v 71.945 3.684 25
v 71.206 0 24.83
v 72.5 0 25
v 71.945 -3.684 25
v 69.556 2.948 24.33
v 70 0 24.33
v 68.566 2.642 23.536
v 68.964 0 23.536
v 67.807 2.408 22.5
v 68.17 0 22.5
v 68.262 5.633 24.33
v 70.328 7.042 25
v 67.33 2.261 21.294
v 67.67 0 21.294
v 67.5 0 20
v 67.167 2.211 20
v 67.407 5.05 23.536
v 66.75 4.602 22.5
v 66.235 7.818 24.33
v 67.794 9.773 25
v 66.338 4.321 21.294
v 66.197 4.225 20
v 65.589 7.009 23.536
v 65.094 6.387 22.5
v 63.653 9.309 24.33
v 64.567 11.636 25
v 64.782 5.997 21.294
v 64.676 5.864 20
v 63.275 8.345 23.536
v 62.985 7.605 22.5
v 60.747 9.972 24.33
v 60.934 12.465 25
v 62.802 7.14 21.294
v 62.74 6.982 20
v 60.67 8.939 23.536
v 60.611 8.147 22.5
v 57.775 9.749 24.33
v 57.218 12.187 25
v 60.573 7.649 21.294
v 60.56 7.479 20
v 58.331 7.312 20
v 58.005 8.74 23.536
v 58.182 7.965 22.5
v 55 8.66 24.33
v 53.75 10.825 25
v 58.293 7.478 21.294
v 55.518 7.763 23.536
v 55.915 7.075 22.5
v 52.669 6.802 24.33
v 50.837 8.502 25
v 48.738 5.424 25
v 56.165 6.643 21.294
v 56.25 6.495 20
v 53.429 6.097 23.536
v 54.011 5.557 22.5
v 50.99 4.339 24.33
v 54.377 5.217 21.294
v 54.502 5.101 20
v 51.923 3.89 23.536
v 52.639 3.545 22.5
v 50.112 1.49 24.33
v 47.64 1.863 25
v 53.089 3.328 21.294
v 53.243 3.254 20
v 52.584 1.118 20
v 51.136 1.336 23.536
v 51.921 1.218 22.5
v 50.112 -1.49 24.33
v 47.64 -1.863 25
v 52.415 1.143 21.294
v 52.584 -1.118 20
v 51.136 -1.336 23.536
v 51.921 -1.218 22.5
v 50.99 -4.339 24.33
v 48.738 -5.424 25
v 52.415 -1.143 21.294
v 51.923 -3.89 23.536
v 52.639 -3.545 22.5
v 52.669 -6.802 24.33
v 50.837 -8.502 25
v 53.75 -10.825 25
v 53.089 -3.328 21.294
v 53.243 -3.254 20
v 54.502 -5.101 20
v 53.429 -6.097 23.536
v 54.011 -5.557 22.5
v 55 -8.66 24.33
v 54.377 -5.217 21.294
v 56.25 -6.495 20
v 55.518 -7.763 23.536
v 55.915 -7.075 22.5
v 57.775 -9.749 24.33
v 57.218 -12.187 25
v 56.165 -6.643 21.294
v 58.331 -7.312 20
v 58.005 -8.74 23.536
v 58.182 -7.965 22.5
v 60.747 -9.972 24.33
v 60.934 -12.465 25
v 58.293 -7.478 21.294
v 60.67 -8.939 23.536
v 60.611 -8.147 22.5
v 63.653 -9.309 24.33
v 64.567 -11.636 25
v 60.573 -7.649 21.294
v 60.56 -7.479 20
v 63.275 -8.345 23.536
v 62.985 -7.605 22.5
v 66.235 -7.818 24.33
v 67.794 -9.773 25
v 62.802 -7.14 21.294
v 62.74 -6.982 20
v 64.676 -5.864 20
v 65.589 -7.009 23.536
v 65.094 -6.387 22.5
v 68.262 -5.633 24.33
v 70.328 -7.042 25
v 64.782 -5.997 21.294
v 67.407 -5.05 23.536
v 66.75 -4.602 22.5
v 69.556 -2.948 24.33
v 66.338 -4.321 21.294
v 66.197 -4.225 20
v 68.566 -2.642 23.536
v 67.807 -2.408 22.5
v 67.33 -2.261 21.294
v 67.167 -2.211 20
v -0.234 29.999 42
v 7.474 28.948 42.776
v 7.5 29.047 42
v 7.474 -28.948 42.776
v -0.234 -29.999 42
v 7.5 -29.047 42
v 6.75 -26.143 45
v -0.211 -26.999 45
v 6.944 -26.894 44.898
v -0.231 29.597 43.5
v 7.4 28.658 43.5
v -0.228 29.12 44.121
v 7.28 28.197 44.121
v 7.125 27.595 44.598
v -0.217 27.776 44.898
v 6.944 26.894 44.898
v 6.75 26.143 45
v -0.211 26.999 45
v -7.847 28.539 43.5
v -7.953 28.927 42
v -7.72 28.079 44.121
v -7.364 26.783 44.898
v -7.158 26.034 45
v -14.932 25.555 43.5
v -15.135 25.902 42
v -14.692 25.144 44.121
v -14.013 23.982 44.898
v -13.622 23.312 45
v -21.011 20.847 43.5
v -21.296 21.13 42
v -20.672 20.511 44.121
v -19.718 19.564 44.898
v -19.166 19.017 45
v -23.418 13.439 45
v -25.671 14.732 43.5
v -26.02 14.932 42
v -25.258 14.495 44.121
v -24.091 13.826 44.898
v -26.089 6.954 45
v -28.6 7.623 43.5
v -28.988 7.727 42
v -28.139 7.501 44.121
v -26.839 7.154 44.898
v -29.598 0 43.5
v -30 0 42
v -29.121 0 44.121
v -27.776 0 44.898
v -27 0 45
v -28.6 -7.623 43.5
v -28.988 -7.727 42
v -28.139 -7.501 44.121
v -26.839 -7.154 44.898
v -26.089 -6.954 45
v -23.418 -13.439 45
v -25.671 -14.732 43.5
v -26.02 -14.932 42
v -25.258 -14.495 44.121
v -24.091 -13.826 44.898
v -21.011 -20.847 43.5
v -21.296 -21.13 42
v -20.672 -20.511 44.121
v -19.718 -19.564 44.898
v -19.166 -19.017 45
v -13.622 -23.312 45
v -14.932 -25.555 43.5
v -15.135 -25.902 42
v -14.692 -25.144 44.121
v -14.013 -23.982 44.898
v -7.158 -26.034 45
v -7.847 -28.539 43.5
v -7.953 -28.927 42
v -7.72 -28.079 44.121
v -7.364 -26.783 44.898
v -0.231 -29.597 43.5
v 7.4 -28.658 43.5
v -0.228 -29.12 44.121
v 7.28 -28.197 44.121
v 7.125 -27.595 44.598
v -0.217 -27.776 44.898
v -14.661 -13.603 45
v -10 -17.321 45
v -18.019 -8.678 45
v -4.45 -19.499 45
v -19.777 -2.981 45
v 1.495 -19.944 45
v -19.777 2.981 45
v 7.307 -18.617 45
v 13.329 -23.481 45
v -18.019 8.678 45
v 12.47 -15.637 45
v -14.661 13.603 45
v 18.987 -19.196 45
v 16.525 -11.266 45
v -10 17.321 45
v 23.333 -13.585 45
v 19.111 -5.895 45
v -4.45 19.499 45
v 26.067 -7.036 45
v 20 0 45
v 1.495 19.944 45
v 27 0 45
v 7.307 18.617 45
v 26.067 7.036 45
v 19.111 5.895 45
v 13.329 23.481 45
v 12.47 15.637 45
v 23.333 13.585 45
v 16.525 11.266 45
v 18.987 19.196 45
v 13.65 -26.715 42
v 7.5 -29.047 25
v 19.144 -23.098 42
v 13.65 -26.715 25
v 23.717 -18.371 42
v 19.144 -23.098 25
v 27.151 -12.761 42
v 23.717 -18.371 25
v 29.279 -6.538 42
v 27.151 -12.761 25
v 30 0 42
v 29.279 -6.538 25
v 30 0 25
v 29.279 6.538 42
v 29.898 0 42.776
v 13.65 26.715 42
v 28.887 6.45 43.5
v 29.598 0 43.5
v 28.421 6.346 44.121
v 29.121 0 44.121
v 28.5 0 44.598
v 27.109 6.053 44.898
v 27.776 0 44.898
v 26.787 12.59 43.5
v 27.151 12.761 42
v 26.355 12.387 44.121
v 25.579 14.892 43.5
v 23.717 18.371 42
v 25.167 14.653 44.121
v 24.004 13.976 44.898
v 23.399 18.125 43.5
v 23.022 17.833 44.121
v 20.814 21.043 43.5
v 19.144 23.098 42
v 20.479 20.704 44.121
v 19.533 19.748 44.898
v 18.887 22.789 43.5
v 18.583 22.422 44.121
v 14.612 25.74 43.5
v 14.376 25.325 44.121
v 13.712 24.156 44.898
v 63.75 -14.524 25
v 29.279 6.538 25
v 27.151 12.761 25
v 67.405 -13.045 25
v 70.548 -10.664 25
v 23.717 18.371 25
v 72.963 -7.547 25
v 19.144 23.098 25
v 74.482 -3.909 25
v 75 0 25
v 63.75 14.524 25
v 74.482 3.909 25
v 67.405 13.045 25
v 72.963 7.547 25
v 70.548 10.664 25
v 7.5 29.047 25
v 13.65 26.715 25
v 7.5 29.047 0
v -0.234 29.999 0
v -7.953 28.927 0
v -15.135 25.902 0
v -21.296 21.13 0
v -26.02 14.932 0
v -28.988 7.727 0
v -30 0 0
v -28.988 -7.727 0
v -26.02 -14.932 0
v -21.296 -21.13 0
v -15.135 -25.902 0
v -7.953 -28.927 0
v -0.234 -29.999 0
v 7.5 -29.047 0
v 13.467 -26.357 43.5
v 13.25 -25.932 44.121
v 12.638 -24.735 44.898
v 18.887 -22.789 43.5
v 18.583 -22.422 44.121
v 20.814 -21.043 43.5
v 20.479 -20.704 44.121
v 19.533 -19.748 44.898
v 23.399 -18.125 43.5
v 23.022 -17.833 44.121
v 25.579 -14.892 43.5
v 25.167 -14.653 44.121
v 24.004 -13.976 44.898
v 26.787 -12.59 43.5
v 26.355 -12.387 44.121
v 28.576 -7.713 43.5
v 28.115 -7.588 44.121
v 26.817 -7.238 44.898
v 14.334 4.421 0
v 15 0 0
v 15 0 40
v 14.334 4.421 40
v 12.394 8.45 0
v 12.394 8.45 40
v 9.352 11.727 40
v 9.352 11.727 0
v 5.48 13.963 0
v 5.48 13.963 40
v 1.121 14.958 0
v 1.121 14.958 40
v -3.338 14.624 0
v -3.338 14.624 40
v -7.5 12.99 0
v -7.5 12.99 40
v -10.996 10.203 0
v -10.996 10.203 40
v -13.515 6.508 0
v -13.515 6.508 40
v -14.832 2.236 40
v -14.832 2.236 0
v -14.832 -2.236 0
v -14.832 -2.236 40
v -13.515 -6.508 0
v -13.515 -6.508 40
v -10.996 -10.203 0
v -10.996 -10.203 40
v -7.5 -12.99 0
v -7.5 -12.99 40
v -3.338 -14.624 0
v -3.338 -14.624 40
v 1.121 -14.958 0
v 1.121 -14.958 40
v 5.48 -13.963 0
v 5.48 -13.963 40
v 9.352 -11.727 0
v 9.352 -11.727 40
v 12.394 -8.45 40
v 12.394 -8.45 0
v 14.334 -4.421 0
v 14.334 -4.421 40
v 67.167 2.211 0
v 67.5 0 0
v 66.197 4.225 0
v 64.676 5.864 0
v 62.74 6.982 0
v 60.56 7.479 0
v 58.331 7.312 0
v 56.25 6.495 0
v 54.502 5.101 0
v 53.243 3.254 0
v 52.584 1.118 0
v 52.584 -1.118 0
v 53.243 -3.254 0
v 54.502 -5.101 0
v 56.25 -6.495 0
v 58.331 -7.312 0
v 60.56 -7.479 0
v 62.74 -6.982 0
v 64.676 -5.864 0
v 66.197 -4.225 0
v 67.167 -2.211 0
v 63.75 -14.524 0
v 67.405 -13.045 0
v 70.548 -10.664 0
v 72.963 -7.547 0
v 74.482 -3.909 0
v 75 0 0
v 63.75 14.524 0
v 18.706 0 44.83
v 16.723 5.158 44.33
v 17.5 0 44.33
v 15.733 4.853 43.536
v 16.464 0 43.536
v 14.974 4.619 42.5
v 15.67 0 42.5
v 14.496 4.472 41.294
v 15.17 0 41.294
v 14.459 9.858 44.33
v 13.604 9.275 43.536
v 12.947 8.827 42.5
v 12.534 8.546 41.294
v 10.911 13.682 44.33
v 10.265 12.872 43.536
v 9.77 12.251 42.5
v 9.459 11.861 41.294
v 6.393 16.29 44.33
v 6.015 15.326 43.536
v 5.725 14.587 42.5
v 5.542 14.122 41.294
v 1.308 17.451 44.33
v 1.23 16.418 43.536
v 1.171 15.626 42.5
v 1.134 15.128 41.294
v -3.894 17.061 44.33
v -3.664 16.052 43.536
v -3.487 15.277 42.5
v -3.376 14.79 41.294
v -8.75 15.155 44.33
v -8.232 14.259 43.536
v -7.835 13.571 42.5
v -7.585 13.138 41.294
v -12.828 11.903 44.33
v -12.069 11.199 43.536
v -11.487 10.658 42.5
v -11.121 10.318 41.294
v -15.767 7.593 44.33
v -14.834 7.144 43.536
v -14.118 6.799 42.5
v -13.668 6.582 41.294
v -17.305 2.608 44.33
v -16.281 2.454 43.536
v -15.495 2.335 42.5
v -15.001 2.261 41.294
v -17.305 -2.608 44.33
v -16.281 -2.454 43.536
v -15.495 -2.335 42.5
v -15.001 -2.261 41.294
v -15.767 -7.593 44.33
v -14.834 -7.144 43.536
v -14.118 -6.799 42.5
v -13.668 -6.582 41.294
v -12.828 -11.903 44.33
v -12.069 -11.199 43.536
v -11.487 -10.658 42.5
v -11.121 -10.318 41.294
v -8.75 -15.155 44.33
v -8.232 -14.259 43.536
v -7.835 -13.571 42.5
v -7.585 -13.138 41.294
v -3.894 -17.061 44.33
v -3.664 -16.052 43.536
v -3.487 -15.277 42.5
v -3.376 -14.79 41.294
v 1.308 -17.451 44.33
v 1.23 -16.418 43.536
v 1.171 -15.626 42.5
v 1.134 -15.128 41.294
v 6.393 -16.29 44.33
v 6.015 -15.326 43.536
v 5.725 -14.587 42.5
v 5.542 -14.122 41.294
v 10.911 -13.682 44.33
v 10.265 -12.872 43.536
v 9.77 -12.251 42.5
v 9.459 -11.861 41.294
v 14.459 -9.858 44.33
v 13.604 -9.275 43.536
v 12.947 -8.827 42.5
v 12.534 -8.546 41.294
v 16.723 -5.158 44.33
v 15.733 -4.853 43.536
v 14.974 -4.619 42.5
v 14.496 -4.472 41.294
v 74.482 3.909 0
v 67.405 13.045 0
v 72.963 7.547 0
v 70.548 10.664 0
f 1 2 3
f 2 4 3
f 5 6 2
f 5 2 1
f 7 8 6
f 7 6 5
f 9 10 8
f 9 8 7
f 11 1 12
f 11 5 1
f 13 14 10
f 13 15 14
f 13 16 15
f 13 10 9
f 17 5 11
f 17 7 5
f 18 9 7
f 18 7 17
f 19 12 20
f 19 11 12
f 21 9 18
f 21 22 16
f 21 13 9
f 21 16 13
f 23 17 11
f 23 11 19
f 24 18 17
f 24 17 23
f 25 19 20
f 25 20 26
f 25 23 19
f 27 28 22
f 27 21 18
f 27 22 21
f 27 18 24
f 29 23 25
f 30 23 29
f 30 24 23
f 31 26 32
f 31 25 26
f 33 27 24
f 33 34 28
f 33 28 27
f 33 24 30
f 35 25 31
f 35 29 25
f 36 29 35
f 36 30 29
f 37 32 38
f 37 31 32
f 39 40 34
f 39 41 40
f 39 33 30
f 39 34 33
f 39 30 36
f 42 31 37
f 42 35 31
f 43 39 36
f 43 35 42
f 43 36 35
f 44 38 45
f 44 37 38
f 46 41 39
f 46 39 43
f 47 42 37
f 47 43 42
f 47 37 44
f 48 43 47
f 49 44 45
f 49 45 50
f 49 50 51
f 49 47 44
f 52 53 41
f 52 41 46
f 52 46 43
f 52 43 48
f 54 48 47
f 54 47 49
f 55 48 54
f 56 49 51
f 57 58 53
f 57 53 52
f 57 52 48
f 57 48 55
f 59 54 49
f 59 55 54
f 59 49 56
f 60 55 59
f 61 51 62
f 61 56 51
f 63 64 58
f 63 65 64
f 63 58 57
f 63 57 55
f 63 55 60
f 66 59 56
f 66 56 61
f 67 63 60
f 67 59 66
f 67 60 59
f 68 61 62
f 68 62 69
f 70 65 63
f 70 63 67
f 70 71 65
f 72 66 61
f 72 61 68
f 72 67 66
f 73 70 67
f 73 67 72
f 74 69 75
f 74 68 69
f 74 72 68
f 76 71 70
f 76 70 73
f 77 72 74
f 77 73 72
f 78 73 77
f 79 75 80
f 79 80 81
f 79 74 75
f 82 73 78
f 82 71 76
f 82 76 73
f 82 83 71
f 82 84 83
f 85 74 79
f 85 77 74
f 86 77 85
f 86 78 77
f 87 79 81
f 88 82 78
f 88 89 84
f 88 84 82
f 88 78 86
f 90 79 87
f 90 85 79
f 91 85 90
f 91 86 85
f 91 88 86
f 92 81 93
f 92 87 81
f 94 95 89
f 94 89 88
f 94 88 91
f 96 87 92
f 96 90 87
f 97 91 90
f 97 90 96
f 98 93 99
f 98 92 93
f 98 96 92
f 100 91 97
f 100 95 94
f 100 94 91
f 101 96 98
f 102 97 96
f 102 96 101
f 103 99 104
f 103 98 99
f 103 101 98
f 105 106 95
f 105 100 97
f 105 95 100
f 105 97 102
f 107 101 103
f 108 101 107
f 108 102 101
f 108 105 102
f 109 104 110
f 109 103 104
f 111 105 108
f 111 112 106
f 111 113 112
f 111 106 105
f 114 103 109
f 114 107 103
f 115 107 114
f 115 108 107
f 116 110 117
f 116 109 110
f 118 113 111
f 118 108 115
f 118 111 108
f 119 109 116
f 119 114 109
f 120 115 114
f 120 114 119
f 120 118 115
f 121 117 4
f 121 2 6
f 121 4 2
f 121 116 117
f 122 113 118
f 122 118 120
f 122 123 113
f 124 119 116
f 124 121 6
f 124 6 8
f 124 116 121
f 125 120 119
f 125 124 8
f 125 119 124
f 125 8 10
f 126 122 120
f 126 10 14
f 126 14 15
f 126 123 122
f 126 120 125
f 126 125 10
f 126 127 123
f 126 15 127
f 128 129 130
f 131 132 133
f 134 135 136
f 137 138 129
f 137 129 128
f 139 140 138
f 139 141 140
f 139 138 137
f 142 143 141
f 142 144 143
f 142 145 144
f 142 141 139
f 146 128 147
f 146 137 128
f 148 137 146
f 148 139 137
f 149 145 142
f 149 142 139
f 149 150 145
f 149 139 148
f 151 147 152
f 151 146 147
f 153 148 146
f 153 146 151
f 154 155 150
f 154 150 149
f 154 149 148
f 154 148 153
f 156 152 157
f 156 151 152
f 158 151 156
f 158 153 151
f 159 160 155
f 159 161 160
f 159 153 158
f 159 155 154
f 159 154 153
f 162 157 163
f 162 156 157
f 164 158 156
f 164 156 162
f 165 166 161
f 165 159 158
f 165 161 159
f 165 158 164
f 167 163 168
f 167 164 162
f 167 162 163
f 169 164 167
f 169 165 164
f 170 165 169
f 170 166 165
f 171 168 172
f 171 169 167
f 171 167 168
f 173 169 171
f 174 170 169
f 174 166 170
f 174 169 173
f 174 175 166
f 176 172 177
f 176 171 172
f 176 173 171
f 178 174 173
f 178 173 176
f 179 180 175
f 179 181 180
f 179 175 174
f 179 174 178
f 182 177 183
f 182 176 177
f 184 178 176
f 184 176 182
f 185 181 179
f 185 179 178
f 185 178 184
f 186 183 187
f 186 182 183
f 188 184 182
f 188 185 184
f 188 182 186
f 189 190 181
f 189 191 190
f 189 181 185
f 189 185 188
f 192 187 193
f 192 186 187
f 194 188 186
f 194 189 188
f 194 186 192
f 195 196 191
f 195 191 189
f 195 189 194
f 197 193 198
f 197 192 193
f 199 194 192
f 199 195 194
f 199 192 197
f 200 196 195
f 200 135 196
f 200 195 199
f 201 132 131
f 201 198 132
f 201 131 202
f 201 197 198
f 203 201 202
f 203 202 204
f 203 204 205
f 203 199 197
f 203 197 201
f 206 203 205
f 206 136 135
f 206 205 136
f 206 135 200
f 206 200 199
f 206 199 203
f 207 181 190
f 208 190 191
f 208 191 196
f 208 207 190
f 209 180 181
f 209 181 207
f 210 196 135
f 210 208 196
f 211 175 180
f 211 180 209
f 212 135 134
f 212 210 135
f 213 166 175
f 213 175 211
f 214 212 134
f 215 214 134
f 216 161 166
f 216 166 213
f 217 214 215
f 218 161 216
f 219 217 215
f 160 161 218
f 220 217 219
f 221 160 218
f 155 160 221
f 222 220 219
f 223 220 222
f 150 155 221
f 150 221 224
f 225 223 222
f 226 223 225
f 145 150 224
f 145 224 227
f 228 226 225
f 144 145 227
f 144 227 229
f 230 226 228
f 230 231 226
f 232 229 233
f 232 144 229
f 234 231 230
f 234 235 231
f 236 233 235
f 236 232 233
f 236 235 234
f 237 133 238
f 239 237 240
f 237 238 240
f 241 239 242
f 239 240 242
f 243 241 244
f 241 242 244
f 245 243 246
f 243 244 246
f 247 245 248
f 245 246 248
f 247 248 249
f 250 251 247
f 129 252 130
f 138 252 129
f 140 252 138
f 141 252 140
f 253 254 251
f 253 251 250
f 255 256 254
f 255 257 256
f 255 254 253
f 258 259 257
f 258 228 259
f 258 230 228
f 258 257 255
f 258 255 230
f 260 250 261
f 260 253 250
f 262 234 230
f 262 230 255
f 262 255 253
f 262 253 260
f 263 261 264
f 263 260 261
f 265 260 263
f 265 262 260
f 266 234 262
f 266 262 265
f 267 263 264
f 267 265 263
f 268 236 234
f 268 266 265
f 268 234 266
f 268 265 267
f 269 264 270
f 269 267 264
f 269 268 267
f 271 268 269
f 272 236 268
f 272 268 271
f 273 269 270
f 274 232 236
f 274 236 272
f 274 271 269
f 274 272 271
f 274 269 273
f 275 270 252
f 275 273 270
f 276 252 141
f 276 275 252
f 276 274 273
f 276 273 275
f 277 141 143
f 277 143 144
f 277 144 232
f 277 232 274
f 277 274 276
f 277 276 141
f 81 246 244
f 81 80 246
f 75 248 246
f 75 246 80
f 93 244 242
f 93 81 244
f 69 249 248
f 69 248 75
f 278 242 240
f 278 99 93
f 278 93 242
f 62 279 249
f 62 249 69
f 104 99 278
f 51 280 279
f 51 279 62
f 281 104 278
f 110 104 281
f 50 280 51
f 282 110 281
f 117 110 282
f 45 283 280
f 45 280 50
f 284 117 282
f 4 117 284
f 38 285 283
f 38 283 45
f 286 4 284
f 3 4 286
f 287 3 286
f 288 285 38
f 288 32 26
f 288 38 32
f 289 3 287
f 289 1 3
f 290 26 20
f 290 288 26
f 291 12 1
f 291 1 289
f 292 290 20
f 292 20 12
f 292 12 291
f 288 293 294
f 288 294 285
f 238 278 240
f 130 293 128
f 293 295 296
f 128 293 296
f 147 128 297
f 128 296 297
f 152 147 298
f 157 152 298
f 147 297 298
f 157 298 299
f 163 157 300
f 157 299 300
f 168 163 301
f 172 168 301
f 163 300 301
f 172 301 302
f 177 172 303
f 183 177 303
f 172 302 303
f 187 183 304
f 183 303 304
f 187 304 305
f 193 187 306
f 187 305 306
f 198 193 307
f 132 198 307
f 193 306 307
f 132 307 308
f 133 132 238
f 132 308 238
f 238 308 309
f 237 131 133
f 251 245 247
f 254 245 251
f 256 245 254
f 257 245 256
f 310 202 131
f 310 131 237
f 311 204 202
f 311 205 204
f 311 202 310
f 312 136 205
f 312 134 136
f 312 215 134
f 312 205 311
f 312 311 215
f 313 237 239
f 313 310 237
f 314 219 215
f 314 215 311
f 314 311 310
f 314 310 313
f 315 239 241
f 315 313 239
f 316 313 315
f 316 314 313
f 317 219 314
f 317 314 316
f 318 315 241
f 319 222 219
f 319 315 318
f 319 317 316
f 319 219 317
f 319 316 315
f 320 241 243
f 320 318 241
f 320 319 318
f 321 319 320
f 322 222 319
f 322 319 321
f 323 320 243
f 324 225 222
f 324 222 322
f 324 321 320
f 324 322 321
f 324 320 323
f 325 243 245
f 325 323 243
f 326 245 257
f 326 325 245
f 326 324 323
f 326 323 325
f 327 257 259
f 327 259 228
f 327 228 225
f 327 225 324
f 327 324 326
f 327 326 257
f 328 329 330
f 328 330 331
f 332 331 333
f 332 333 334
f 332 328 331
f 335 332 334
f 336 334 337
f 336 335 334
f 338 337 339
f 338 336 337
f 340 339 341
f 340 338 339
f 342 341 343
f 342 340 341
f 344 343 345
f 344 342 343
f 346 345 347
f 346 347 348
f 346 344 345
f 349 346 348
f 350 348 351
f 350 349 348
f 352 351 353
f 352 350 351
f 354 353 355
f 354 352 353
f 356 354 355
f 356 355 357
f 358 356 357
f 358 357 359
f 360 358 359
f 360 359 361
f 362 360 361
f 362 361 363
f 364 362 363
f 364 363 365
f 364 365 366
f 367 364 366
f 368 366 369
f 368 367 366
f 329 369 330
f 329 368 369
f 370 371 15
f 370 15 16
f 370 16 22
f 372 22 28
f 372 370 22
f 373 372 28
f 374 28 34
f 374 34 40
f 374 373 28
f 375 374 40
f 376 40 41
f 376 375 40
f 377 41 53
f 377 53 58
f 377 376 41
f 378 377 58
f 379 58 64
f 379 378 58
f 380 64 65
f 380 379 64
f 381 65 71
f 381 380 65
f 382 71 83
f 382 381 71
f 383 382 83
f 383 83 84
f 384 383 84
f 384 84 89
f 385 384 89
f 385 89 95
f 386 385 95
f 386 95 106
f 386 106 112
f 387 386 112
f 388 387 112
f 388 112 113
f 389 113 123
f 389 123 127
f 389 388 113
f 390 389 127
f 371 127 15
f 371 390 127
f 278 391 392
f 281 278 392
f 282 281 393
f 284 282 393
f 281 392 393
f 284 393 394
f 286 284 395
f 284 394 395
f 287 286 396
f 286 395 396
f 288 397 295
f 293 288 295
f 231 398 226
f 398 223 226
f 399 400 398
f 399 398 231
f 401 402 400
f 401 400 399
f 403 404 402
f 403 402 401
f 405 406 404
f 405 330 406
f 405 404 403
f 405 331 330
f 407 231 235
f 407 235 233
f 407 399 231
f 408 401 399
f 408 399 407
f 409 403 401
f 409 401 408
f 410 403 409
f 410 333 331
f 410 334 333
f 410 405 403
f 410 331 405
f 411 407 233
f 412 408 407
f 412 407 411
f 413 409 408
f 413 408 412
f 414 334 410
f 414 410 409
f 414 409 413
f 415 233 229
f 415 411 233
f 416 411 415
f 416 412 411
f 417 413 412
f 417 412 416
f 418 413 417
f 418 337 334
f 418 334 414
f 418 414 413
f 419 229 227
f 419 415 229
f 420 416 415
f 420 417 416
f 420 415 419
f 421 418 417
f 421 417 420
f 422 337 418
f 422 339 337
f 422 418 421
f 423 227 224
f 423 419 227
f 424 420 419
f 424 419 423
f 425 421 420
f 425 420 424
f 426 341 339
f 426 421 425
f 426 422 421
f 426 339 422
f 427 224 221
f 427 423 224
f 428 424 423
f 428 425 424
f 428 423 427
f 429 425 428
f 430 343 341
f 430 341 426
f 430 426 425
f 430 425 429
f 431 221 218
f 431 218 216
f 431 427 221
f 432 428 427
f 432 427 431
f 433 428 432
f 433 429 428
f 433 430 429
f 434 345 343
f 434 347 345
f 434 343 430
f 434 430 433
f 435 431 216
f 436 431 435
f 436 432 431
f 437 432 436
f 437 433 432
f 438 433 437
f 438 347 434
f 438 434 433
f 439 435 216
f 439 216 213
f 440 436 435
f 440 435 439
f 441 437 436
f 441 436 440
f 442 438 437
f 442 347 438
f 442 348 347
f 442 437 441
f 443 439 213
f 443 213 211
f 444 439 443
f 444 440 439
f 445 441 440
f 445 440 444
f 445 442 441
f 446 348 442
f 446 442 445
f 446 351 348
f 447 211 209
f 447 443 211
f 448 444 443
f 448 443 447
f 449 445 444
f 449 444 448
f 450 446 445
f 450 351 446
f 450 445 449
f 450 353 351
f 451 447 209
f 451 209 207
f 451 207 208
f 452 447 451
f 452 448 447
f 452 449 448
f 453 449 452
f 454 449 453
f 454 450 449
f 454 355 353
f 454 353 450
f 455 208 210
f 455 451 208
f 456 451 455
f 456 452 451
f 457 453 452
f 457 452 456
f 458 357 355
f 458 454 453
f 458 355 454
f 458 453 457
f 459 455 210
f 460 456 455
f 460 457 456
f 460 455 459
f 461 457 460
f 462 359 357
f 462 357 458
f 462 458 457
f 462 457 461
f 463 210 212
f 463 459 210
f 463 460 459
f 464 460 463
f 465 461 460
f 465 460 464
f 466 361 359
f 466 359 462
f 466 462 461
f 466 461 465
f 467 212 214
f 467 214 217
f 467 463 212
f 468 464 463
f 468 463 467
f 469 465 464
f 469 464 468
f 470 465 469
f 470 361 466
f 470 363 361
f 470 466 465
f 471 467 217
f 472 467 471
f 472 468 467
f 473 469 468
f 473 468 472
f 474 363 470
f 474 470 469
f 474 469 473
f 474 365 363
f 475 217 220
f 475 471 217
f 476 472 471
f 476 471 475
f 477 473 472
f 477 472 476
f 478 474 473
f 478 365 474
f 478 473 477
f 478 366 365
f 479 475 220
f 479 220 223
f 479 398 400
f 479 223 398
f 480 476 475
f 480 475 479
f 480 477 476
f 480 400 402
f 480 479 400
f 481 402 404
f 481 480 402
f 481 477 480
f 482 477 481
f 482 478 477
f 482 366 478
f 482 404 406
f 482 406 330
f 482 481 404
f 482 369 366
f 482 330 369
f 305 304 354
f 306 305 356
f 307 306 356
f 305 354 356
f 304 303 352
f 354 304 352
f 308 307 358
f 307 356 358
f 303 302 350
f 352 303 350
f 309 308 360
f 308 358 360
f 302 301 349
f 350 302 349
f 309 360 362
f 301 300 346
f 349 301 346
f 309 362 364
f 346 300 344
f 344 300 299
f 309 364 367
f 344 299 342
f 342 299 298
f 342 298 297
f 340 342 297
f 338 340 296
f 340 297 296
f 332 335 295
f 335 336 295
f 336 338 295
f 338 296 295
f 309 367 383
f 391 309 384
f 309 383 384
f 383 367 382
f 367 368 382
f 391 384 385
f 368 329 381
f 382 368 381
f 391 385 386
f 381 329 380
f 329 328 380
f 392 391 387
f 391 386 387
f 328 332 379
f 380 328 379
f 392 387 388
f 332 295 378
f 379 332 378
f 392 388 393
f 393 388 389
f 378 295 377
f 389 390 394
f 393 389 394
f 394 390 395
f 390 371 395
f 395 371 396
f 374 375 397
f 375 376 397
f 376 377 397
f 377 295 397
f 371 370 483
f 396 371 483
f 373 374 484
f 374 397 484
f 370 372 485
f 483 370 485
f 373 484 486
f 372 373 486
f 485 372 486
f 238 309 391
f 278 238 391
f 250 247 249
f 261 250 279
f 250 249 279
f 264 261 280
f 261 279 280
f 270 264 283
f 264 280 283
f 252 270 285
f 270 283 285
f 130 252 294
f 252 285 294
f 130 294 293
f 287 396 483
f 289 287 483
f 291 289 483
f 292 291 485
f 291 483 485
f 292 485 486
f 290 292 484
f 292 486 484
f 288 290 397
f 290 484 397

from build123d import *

# Parameters (mm, degrees)
F0_R     = 15
F0_R_2   = 7.5
F1_DEPTH = 25
F2_DEPTH = 45
F3_R     = 3
F4_R     = 5


with BuildPart() as f1:
    # F0 (on Top) → F1 (new body)
    with BuildSketch(Plane.XY):
        with BuildLine():
            ThreePointArc((7.5, -29.047375), (23.717082, -18.371173), (30, 0))
            ThreePointArc((30, 0), (23.717082, 18.371173), (7.5, 29.047375))
            ThreePointArc((7.5, 29.047375), (-30, 0), (7.5, -29.047375))
        make_face()
        Circle(F0_R, mode=Mode.SUBTRACT)
        with BuildLine():
            ThreePointArc((7.5, 29.047375), (23.717082, 18.371173), (30, 0))
            ThreePointArc((30, 0), (23.717082, -18.371173), (7.5, -29.047375))
            Line((7.5, -29.047375), (63.75, -14.523688))
            ThreePointArc((63.75, -14.523688), (45, 0), (63.75, 14.523688))
            Line((63.75, 14.523688), (7.5, 29.047375))
        make_face()
        with BuildLine():
            ThreePointArc((75, 0), (71.858541, 9.185587), (63.75, 14.523688))
            ThreePointArc((63.75, 14.523688), (45, 0), (63.75, -14.523688))
            ThreePointArc((63.75, -14.523688), (71.858541, -9.185587), (75, 0))
        make_face()
        with Locations((60, 0)):
            Circle(F0_R_2, mode=Mode.SUBTRACT)
    extrude(amount=F1_DEPTH)

    # F0 (on Top) → F2 (join)
    with BuildSketch(Plane.XY):
        with BuildLine():
            ThreePointArc((7.5, -29.047375), (23.717082, -18.371173), (30, 0))
            ThreePointArc((30, 0), (23.717082, 18.371173), (7.5, 29.047375))
            ThreePointArc((7.5, 29.047375), (-30, 0), (7.5, -29.047375))
        make_face()
        Circle(F0_R, mode=Mode.SUBTRACT)
    extrude(amount=F2_DEPTH)

    # F3
    f3_edges = [f1.edges().sort_by_distance(p)[0] for p in [
        (-7.5, 29.047375, 45),
    ]]
    fillet(f3_edges, radius=F3_R)

    # F4
    f4_edges = [f1.edges().sort_by_distance(p)[0] for p in [
        (-15, 0, 45),
        (52.5, 0, 25),
    ]]
    fillet(f4_edges, radius=F4_R)


solid = f1.part
